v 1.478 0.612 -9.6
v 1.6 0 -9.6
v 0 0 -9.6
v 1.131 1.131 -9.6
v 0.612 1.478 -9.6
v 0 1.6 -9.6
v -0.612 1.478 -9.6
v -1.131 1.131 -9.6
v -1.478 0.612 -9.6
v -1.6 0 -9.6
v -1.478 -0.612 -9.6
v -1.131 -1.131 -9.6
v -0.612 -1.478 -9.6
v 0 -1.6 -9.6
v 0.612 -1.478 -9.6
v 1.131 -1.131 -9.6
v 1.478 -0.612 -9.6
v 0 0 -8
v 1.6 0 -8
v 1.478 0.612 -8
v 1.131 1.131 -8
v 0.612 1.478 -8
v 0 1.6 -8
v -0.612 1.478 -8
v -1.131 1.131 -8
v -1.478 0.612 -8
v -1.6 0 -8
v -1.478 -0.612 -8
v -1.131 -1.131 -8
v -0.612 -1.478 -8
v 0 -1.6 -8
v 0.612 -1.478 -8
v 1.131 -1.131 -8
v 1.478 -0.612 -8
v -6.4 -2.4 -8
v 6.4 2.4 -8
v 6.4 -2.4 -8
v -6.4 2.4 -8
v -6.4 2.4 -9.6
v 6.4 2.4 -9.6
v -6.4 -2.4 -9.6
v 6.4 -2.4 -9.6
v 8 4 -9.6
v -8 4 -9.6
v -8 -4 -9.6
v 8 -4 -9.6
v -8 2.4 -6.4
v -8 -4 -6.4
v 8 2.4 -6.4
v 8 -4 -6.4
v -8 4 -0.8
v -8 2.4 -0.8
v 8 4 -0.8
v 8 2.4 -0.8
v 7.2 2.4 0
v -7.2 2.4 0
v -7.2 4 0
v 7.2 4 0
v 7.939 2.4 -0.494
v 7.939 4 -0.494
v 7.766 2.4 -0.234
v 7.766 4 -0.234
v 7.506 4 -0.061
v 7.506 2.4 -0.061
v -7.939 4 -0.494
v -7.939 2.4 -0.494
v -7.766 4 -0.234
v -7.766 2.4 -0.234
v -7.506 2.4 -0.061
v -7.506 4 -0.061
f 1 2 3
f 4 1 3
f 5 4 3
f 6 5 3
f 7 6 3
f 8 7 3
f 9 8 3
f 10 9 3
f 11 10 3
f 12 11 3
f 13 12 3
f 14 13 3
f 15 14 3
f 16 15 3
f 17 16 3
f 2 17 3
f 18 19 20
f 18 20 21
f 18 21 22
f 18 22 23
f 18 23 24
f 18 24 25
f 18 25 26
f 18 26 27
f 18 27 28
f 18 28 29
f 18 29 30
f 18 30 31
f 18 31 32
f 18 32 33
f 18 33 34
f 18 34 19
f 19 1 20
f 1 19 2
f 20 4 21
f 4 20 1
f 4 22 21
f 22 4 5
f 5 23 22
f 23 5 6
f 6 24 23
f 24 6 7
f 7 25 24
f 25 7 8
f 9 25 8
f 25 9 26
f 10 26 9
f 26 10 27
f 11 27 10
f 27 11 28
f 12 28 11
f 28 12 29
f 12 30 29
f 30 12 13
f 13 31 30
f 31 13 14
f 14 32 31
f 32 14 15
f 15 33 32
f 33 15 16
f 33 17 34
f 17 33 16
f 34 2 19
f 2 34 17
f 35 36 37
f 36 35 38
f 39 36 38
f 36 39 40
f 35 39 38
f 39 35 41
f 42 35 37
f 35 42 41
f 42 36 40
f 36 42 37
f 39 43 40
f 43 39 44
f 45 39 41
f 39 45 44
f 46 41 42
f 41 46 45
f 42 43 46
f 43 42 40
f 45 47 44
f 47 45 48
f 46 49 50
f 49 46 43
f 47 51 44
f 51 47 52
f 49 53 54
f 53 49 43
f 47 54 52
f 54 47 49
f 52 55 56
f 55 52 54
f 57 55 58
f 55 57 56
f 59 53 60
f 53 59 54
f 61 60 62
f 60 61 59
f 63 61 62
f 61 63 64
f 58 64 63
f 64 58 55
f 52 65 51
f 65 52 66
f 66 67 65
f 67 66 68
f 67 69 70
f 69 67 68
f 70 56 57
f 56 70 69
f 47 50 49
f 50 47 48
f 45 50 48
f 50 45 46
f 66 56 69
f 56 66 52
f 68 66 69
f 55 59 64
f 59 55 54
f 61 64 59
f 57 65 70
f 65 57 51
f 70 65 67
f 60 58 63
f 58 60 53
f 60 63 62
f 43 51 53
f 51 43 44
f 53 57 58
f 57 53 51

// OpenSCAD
// file: ../p/4-4edge.scad
use <../lib.scad>
function ldraw_lib__4_4edge() = [
// 0 Circle 1.0
// 0 Name: 4-4edge.dat
// 0 Author: James Jessiman
// 0 !LDRAW_ORG Primitive UPDATE 2017-01
// 0 !LICENSE Licensed under CC BY 2.0 and CC BY 4.0 : see CAreadme.txt
// 
// 0 BFC CERTIFY CCW
  [0,"BFC","CERTIFY"],
  [0,"BFC","CCW"],
// 
// 0 !HISTORY 1998-12-15 [PTadmin] Official Update 1998-10
// 0 !HISTORY 2005-12-28 [PTadmin] Official Update 2005-01
// 0 !HISTORY 2007-06-24 [PTadmin] Header formatted for Contributor Agreement
// 0 !HISTORY 2008-07-01 [PTadmin] Official Update 2008-01
// 0 !HISTORY 2017-01-15 [Steffen] BFCed
// 0 !HISTORY 2017-12-30 [PTadmin] Official Update 2017-01
// 
// 
// 2 24 1 0 0 0.9239 0 0.3827
  [2,24,1,0,0,0.9239,0,0.3827],
// 2 24 0.9239 0 0.3827 0.7071 0 0.7071
  [2,24,0.9239,0,0.3827,0.7071,0,0.7071],
// 2 24 0.7071 0 0.7071 0.3827 0 0.9239
  [2,24,0.7071,0,0.7071,0.3827,0,0.9239],
// 2 24 0.3827 0 0.9239 0 0 1
  [2,24,0.3827,0,0.9239,0,0,1],
// 2 24 0 0 1 -0.3827 0 0.9239
  [2,24,0,0,1,-0.3827,0,0.9239],
// 2 24 -0.3827 0 0.9239 -0.7071 0 0.7071
  [2,24,-0.3827,0,0.9239,-0.7071,0,0.7071],
// 2 24 -0.7071 0 0.7071 -0.9239 0 0.3827
  [2,24,-0.7071,0,0.7071,-0.9239,0,0.3827],
// 2 24 -0.9239 0 0.3827 -1 0 -0
  [2,24,-0.9239,0,0.3827,-1,0,-0],
// 2 24 -1 0 -0 -0.9239 0 -0.3827
  [2,24,-1,0,-0,-0.9239,0,-0.3827],
// 2 24 -0.9239 0 -0.3827 -0.7071 0 -0.7071
  [2,24,-0.9239,0,-0.3827,-0.7071,0,-0.7071],
// 2 24 -0.7071 0 -0.7071 -0.3827 0 -0.9239
  [2,24,-0.7071,0,-0.7071,-0.3827,0,-0.9239],
// 2 24 -0.3827 0 -0.9239 0 0 -1
  [2,24,-0.3827,0,-0.9239,0,0,-1],
// 2 24 0 0 -1 0.3827 0 -0.9239
  [2,24,0,0,-1,0.3827,0,-0.9239],
// 2 24 0.3827 0 -0.9239 0.7071 0 -0.7071
  [2,24,0.3827,0,-0.9239,0.7071,0,-0.7071],
// 2 24 0.7071 0 -0.7071 0.9239 0 -0.3827
  [2,24,0.7071,0,-0.7071,0.9239,0,-0.3827],
// 2 24 0.9239 0 -0.3827 1 0 0
  [2,24,0.9239,0,-0.3827,1,0,0],
];
module ldraw_lib__4_4edge(step=0, col=false, unit=2/5, alt=false, line=0.2, solid=!$preview)
    makepoly(ldraw_lib__4_4edge(), step=step, col=col, unit=unit, alt=alt, line=line, solid=solid);
ldraw_lib__4_4edge(line=0.2);
// file: ../p/4-4disc.scad
use <../lib.scad>
function ldraw_lib__4_4disc() = [
// 0 Disc 1.0
// 0 Name: 4-4disc.dat
// 0 Author: James Jessiman
// 0 !LDRAW_ORG Primitive UPDATE 2002-02
// 0 !LICENSE Licensed under CC BY 2.0 and CC BY 4.0 : see CAreadme.txt
// 
// 0 BFC CERTIFY CCW
  [0,"BFC","CERTIFY"],
  [0,"BFC","CCW"],
// 
// 0 !HISTORY 1998-12-15 [PTadmin] Official Update 1998-10
// 0 !HISTORY 2002-03-23 [sbliss] Added BFC statement
// 0 !HISTORY 2002-04-25 [PTadmin] Official Update 2002-02
// 0 !HISTORY 2007-06-24 [PTadmin] Header formatted for Contributor Agreement
// 0 !HISTORY 2008-07-01 [PTadmin] Official Update 2008-01
// 
// 
// 3 16 0 0 0 1 0 0 0.9239 0 0.3827
  [3,16,0,0,0,1,0,0,0.9239,0,0.3827],
// 3 16 0 0 0 0.9239 0 0.3827 0.7071 0 0.7071
  [3,16,0,0,0,0.9239,0,0.3827,0.7071,0,0.7071],
// 3 16 0 0 0 0.7071 0 0.7071 0.3827 0 0.9239
  [3,16,0,0,0,0.7071,0,0.7071,0.3827,0,0.9239],
// 3 16 0 0 0 0.3827 0 0.9239 0 0 1
  [3,16,0,0,0,0.3827,0,0.9239,0,0,1],
// 3 16 0 0 0 0 0 1 -0.3827 0 0.9239
  [3,16,0,0,0,0,0,1,-0.3827,0,0.9239],
// 3 16 0 0 0 -0.3827 0 0.9239 -0.7071 0 0.7071
  [3,16,0,0,0,-0.3827,0,0.9239,-0.7071,0,0.7071],
// 3 16 0 0 0 -0.7071 0 0.7071 -0.9239 0 0.3827
  [3,16,0,0,0,-0.7071,0,0.7071,-0.9239,0,0.3827],
// 3 16 0 0 0 -0.9239 0 0.3827 -1 0 -0
  [3,16,0,0,0,-0.9239,0,0.3827,-1,0,-0],
// 3 16 0 0 0 -1 0 -0 -0.9239 0 -0.3827
  [3,16,0,0,0,-1,0,-0,-0.9239,0,-0.3827],
// 3 16 0 0 0 -0.9239 0 -0.3827 -0.7071 0 -0.7071
  [3,16,0,0,0,-0.9239,0,-0.3827,-0.7071,0,-0.7071],
// 3 16 0 0 0 -0.7071 0 -0.7071 -0.3827 0 -0.9239
  [3,16,0,0,0,-0.7071,0,-0.7071,-0.3827,0,-0.9239],
// 3 16 0 0 0 -0.3827 0 -0.9239 0 0 -1
  [3,16,0,0,0,-0.3827,0,-0.9239,0,0,-1],
// 3 16 0 0 0 0 0 -1 0.3827 0 -0.9239
  [3,16,0,0,0,0,0,-1,0.3827,0,-0.9239],
// 3 16 0 0 0 0.3827 0 -0.9239 0.7071 0 -0.7071
  [3,16,0,0,0,0.3827,0,-0.9239,0.7071,0,-0.7071],
// 3 16 0 0 0 0.7071 0 -0.7071 0.9239 0 -0.3827
  [3,16,0,0,0,0.7071,0,-0.7071,0.9239,0,-0.3827],
// 3 16 0 0 0 0.9239 0 -0.3827 1 0 0
  [3,16,0,0,0,0.9239,0,-0.3827,1,0,0],
// 0
];
module ldraw_lib__4_4disc(step=0, col=false, unit=2/5, alt=false, line=0.2, solid=!$preview)
    makepoly(ldraw_lib__4_4disc(), step=step, col=col, unit=unit, alt=alt, line=line, solid=solid);
ldraw_lib__4_4disc(line=0.2);
// file: ../p/4-4cyli.scad
use <../lib.scad>
$fa=1; $fs=0.2;
function ldraw_lib__4_4cyli(realsolid=false) = [
// 0 Cylinder 1.0
// 0 Name: 4-4cyli.dat
// 0 Author: James Jessiman
// 0 !LDRAW_ORG Primitive UPDATE 2005-01
// 0 !LICENSE Licensed under CC BY 2.0 and CC BY 4.0 : see CAreadme.txt
// 
// 0 BFC CERTIFY CCW
  [0,"BFC","CERTIFY"],
  [0,"BFC","CCW"],
// 
// 0 !HISTORY 1998-12-15 [PTadmin] Official Update 1998-10
// 0 !HISTORY 2002-03-23 [sbliss] Added BFC statement; merged headers from files in distributions LDraw 0.27 and Complete.
// 0 !HISTORY 2002-04-25 [PTadmin] Official Update 2002-02
// 0 !HISTORY 2004-12-14 [guyvivan] BFC CCW
// 0 !HISTORY 2005-12-28 [PTadmin] Official Update 2005-01
// 0 !HISTORY 2007-06-24 [PTadmin] Header formatted for Contributor Agreement
// 0 !HISTORY 2008-07-01 [PTadmin] Official Update 2008-01
// 
// 
// 4 16 1 1 0 0.9239 1 0.3827 0.9239 0 0.3827 1 0 0
  [4,16,1,1,0,0.9239,1,0.3827,0.9239,0,0.3827,1,0,0],
// 5 24 1 0 0 1 1 0 0.9239 0 0.3827 0.9239 0 -0.3827
  [5,24,1,0,0,1,1,0,0.9239,0,0.3827,0.9239,0,-0.3827],
// 4 16 0.9239 1 0.3827 0.7071 1 0.7071 0.7071 0 0.7071 0.9239 0 0.3827
  [4,16,0.9239,1,0.3827,0.7071,1,0.7071,0.7071,0,0.7071,0.9239,0,0.3827],
// 5 24 0.9239 0 0.3827 0.9239 1 0.3827 0.7071 0 0.7071 1 0 0
  [5,24,0.9239,0,0.3827,0.9239,1,0.3827,0.7071,0,0.7071,1,0,0],
// 4 16 0.7071 1 0.7071 0.3827 1 0.9239 0.3827 0 0.9239 0.7071 0 0.7071
  [4,16,0.7071,1,0.7071,0.3827,1,0.9239,0.3827,0,0.9239,0.7071,0,0.7071],
// 5 24 0.7071 0 0.7071 0.7071 1 0.7071 0.3827 0 0.9239 0.9239 0 0.3827
  [5,24,0.7071,0,0.7071,0.7071,1,0.7071,0.3827,0,0.9239,0.9239,0,0.3827],
// 4 16 0.3827 1 0.9239 0 1 1 0 0 1 0.3827 0 0.9239
  [4,16,0.3827,1,0.9239,0,1,1,0,0,1,0.3827,0,0.9239],
// 5 24 0.3827 0 0.9239 0.3827 1 0.9239 0 0 1 0.7071 0 0.7071
  [5,24,0.3827,0,0.9239,0.3827,1,0.9239,0,0,1,0.7071,0,0.7071],
// 4 16 0 1 1 -0.3827 1 0.9239 -0.3827 0 0.9239 0 0 1
  [4,16,0,1,1,-0.3827,1,0.9239,-0.3827,0,0.9239,0,0,1],
// 5 24 0 0 1 0 1 1 -0.3827 0 0.9239 0.3827 0 0.9239
  [5,24,0,0,1,0,1,1,-0.3827,0,0.9239,0.3827,0,0.9239],
// 4 16 -0.3827 1 0.9239 -0.7071 1 0.7071 -0.7071 0 0.7071 -0.3827 0 0.9239
  [4,16,-0.3827,1,0.9239,-0.7071,1,0.7071,-0.7071,0,0.7071,-0.3827,0,0.9239],
// 5 24 -0.3827 0 0.9239 -0.3827 1 0.9239 -0.7071 0 0.7071 0 0 1
  [5,24,-0.3827,0,0.9239,-0.3827,1,0.9239,-0.7071,0,0.7071,0,0,1],
// 4 16 -0.7071 1 0.7071 -0.9239 1 0.3827 -0.9239 0 0.3827 -0.7071 0 0.7071
  [4,16,-0.7071,1,0.7071,-0.9239,1,0.3827,-0.9239,0,0.3827,-0.7071,0,0.7071],
// 5 24 -0.7071 0 0.7071 -0.7071 1 0.7071 -0.9239 0 0.3827 -0.3827 0 0.9239
  [5,24,-0.7071,0,0.7071,-0.7071,1,0.7071,-0.9239,0,0.3827,-0.3827,0,0.9239],
// 4 16 -0.9239 1 0.3827 -1 1 0 -1 0 0 -0.9239 0 0.3827
  [4,16,-0.9239,1,0.3827,-1,1,0,-1,0,0,-0.9239,0,0.3827],
// 5 24 -0.9239 0 0.3827 -0.9239 1 0.3827 -1 0 0 -0.7071 0 0.7071
  [5,24,-0.9239,0,0.3827,-0.9239,1,0.3827,-1,0,0,-0.7071,0,0.7071],
// 4 16 -1 1 0 -0.9239 1 -0.3827 -0.9239 0 -0.3827 -1 0 0
  [4,16,-1,1,0,-0.9239,1,-0.3827,-0.9239,0,-0.3827,-1,0,0],
// 5 24 -1 0 0 -1 1 0 -0.9239 0 -0.3827 -0.9239 0 0.3827
  [5,24,-1,0,0,-1,1,0,-0.9239,0,-0.3827,-0.9239,0,0.3827],
// 4 16 -0.9239 1 -0.3827 -0.7071 1 -0.7071 -0.7071 0 -0.7071 -0.9239 0 -0.3827
  [4,16,-0.9239,1,-0.3827,-0.7071,1,-0.7071,-0.7071,0,-0.7071,-0.9239,0,-0.3827],
// 5 24 -0.9239 0 -0.3827 -0.9239 1 -0.3827 -0.7071 0 -0.7071 -1 0 0
  [5,24,-0.9239,0,-0.3827,-0.9239,1,-0.3827,-0.7071,0,-0.7071,-1,0,0],
// 4 16 -0.7071 1 -0.7071 -0.3827 1 -0.9239 -0.3827 0 -0.9239 -0.7071 0 -0.7071
  [4,16,-0.7071,1,-0.7071,-0.3827,1,-0.9239,-0.3827,0,-0.9239,-0.7071,0,-0.7071],
// 5 24 -0.7071 0 -0.7071 -0.7071 1 -0.7071 -0.3827 0 -0.9239 -0.9239 0 -0.3827
  [5,24,-0.7071,0,-0.7071,-0.7071,1,-0.7071,-0.3827,0,-0.9239,-0.9239,0,-0.3827],
// 4 16 -0.3827 1 -0.9239 0 1 -1 0 0 -1 -0.3827 0 -0.9239
  [4,16,-0.3827,1,-0.9239,0,1,-1,0,0,-1,-0.3827,0,-0.9239],
// 5 24 -0.3827 0 -0.9239 -0.3827 1 -0.9239 0 0 -1 -0.7071 0 -0.7071
  [5,24,-0.3827,0,-0.9239,-0.3827,1,-0.9239,0,0,-1,-0.7071,0,-0.7071],
// 4 16 0 1 -1 0.3827 1 -0.9239 0.3827 0 -0.9239 0 0 -1
  [4,16,0,1,-1,0.3827,1,-0.9239,0.3827,0,-0.9239,0,0,-1],
// 5 24 0 0 -1 0 1 -1 0.3827 0 -0.9239 -0.3827 0 -0.9239
  [5,24,0,0,-1,0,1,-1,0.3827,0,-0.9239,-0.3827,0,-0.9239],
// 4 16 0.3827 1 -0.9239 0.7071 1 -0.7071 0.7071 0 -0.7071 0.3827 0 -0.9239
  [4,16,0.3827,1,-0.9239,0.7071,1,-0.7071,0.7071,0,-0.7071,0.3827,0,-0.9239],
// 5 24 0.3827 0 -0.9239 0.3827 1 -0.9239 0.7071 0 -0.7071 0 0 -1
  [5,24,0.3827,0,-0.9239,0.3827,1,-0.9239,0.7071,0,-0.7071,0,0,-1],
// 4 16 0.7071 1 -0.7071 0.9239 1 -0.3827 0.9239 0 -0.3827 0.7071 0 -0.7071
  [4,16,0.7071,1,-0.7071,0.9239,1,-0.3827,0.9239,0,-0.3827,0.7071,0,-0.7071],
// 5 24 0.7071 0 -0.7071 0.7071 1 -0.7071 0.9239 0 -0.3827 0.3827 0 -0.9239
  [5,24,0.7071,0,-0.7071,0.7071,1,-0.7071,0.9239,0,-0.3827,0.3827,0,-0.9239],
// 4 16 0.9239 1 -0.3827 1 1 0 1 0 0 0.9239 0 -0.3827
  [4,16,0.9239,1,-0.3827,1,1,0,1,0,0,0.9239,0,-0.3827],
// 5 24 0.9239 0 -0.3827 0.9239 1 -0.3827 1 0 0 0.7071 0 -0.7071
  [5,24,0.9239,0,-0.3827,0.9239,1,-0.3827,1,0,0,0.7071,0,-0.7071],
// 0
];
module ldraw_lib__4_4cyli(step=0, col=false, unit=2/5, alt=false, line=0.2, solid=!$preview)
    makepoly(ldraw_lib__4_4cyli(solid), step=step, col=col, unit=unit, alt=alt, line=line, solid=solid);
ldraw_lib__4_4cyli(line=0.2);
// file: ../p/1-4edge.scad
use <../lib.scad>
$fa=1; $fs=0.2;
function ldraw_lib__1_4edge(realsolid=false) = [
// 0 Circle 0.25
// 0 Name: 1-4edge.dat
// 0 Author: James Jessiman
// 0 !LDRAW_ORG Primitive UPDATE 2017-01
// 0 !LICENSE Licensed under CC BY 2.0 and CC BY 4.0 : see CAreadme.txt
// 
// 0 BFC CERTIFY CCW
  [0,"BFC","CERTIFY"],
  [0,"BFC","CCW"],
// 
// 0 !HISTORY 2007-06-22 [PTadmin] Header formatted for Contributor Agreement
// 0 !HISTORY 2008-07-01 [PTadmin] Official Update 2008-01
// 0 !HISTORY 2017-01-15 [Steffen] BFCed
// 0 !HISTORY 2017-12-30 [PTadmin] Official Update 2017-01
// 
// 
// 2 24 1 0 0 0.9239 0 0.3827
  [2,24,1,0,0,0.9239,0,0.3827],
// 2 24 0.9239 0 0.3827 0.7071 0 0.7071
  [2,24,0.9239,0,0.3827,0.7071,0,0.7071],
// 2 24 0.7071 0 0.7071 0.3827 0 0.9239
  [2,24,0.7071,0,0.7071,0.3827,0,0.9239],
// 2 24 0.3827 0 0.9239 0 0 1
  [2,24,0.3827,0,0.9239,0,0,1],
];
module ldraw_lib__1_4edge(step=0, col=false, unit=2/5, alt=false, line=0.2, solid=!$preview)
    makepoly(ldraw_lib__1_4edge(solid), step=step, col=col, unit=unit, alt=alt, line=line, solid=solid);
ldraw_lib__1_4edge(line=0.2);
// file: ../p/1-4cyli.scad
use <../lib.scad>
function ldraw_lib__1_4cyli() = [
// 0 Cylinder 0.25
// 0 Name: 1-4cyli.dat
// 0 Author: James Jessiman
// 0 !LDRAW_ORG Primitive UPDATE 2012-01
// 0 !LICENSE Licensed under CC BY 2.0 and CC BY 4.0 : see CAreadme.txt
// 
// 0 BFC CERTIFY CCW
  [0,"BFC","CERTIFY"],
  [0,"BFC","CCW"],
// 
// 0 !HISTORY 2002-03-23 [sbliss] Added BFC statement.
// 0 !HISTORY 2002-04-25 [PTadmin] Official Update 2002-02
// 0 !HISTORY 2007-06-22 [PTadmin] Header formatted for Contributor Agreement
// 0 !HISTORY 2008-07-01 [PTadmin] Official Update 2008-01
// 0 !HISTORY 2012-02-16 [Philo] Changed to CCW
// 0 !HISTORY 2012-03-30 [PTadmin] Official Update 2012-01
// 
// 
// 4 16 1 1 0 0.9239 1 0.3827 0.9239 0 0.3827 1 0 0
  [4,16,1,1,0,0.9239,1,0.3827,0.9239,0,0.3827,1,0,0],
// 5 24 1 0 0 1 1 0 0.9239 0 0.3827 1 0 -1
  [5,24,1,0,0,1,1,0,0.9239,0,0.3827,1,0,-1],
// 4 16 0.9239 1 0.3827 0.7071 1 0.7071 0.7071 0 0.7071 0.9239 0 0.3827
  [4,16,0.9239,1,0.3827,0.7071,1,0.7071,0.7071,0,0.7071,0.9239,0,0.3827],
// 5 24 0.9239 0 0.3827 0.9239 1 0.3827 0.7071 0 0.7071 1 0 0
  [5,24,0.9239,0,0.3827,0.9239,1,0.3827,0.7071,0,0.7071,1,0,0],
// 4 16 0.7071 1 0.7071 0.3827 1 0.9239 0.3827 0 0.9239 0.7071 0 0.7071
  [4,16,0.7071,1,0.7071,0.3827,1,0.9239,0.3827,0,0.9239,0.7071,0,0.7071],
// 5 24 0.7071 0 0.7071 0.7071 1 0.7071 0.3827 0 0.9239 0.9239 0 0.3827
  [5,24,0.7071,0,0.7071,0.7071,1,0.7071,0.3827,0,0.9239,0.9239,0,0.3827],
// 4 16 0.3827 1 0.9239 0 1 1 0 0 1 0.3827 0 0.9239
  [4,16,0.3827,1,0.9239,0,1,1,0,0,1,0.3827,0,0.9239],
// 5 24 0.3827 0 0.9239 0.3827 1 0.9239 0 0 1 0.7071 0 0.7071
  [5,24,0.3827,0,0.9239,0.3827,1,0.9239,0,0,1,0.7071,0,0.7071],
// 5 24 0 0 1 0 1 1 0.3827 0 0.9239 -1 0 1
  [5,24,0,0,1,0,1,1,0.3827,0,0.9239,-1,0,1],
];
module ldraw_lib__1_4cyli(step=0, col=false, unit=2/5, alt=false, line=0.2, solid=!$preview)
    makepoly(ldraw_lib__1_4cyli(), step=step, col=col, unit=unit, alt=alt, line=line, solid=solid);
ldraw_lib__1_4cyli(line=0.2);
// file: ../p/stud3.scad
use <../lib.scad>
use <4-4cyli.scad>
use <4-4disc.scad>
use <4-4edge.scad>
function ldraw_lib__stud3() = [
// 0 Stud Tube Solid
// 0 Name: stud3.dat
// 0 Author: James Jessiman
// 0 !LDRAW_ORG Primitive UPDATE 2012-01
// 0 !LICENSE Licensed under CC BY 4.0 : see CAreadme.txt
// 
// 0 BFC CERTIFY CCW
  [0,"BFC","CERTIFY"],
  [0,"BFC","CCW"],
// 
// 0 !HISTORY 2002-04-04 [sbliss] Modified for BFC compliance
// 0 !HISTORY 2002-04-25 [PTadmin] Official Update 2002-02
// 0 !HISTORY 2007-06-24 [PTadmin] Header formatted for Contributor Agreement
// 0 !HISTORY 2008-07-01 [PTadmin] Official Update 2008-01
// 0 !HISTORY 2012-02-16 [Philo] Changed to CCW
// 0 !HISTORY 2012-03-30 [PTadmin] Official Update 2012-01
// 
// 
// 1 16 0 -4 0 4 0 0 0 1 0 0 0 4 4-4edge.dat
  [1,16,0,-4,0,4,0,0,0,1,0,0,0,4, ldraw_lib__4_4edge()],
// 1 16 0 0 0 4 0 0 0 1 0 0 0 4 4-4edge.dat
  [1,16,0,0,0,4,0,0,0,1,0,0,0,4, ldraw_lib__4_4edge()],
// 1 16 0 -4 0 4 0 0 0 1 0 0 0 4 4-4disc.dat
  [1,16,0,-4,0,4,0,0,0,1,0,0,0,4, ldraw_lib__4_4disc()],
  [-1,16,0,0,0,4,0,0,0,-1,0,0,0,4, ldraw_lib__4_4disc()],
// 1 16 0 -4 0 4 0 0 0 4 0 0 0 4 4-4cyli.dat
  [1,16,0,-4,0,4,0,0,0,4,0,0,0,4, ldraw_lib__4_4cyli()],
];
module ldraw_lib__stud3(step=0, col=false, unit=2/5, alt=false, line=0.2, solid=!$preview)
    makepoly(ldraw_lib__stud3(), step=step, col=col, unit=unit, alt=alt, line=line, solid=solid);
ldraw_lib__stud3(line=0.2);
// file: ../p/box5.scad
use <../lib.scad>
function ldraw_lib__box5() = [
// 0 Box with 5 Faces and All Edges
// 0 Name: box5.dat
// 0 Author: James Jessiman
// 0 !LDRAW_ORG Primitive UPDATE 2012-01
// 0 !LICENSE Licensed under CC BY 2.0 and CC BY 4.0 : see CAreadme.txt
// 
// 0 BFC CERTIFY CCW
  [0,"BFC","CERTIFY"],
  [0,"BFC","CCW"],
// 
// 0 !HISTORY 2002-04-03 [sbliss] Modified for BFC compliance
// 0 !HISTORY 2002-04-25 [PTadmin] Official Update 2002-02
// 0 !HISTORY 2007-06-24 [PTadmin] Header formatted for Contributor Agreement
// 0 !HISTORY 2008-07-01 [PTadmin] Official Update 2008-01
// 0 !HISTORY 2012-02-16 [Philo] Changed to CCW
// 0 !HISTORY 2012-03-30 [PTadmin] Official Update 2012-01
// 
// 
// 2 24 1 1 1 -1 1 1
  [2,24,1,1,1,-1,1,1],
// 2 24 -1 1 1 -1 1 -1
  [2,24,-1,1,1,-1,1,-1],
// 2 24 -1 1 -1 1 1 -1
  [2,24,-1,1,-1,1,1,-1],
// 2 24 1 1 -1 1 1 1
  [2,24,1,1,-1,1,1,1],
// 2 24 1 0 1 -1 0 1
  [2,24,1,0,1,-1,0,1],
// 2 24 -1 0 1 -1 0 -1
  [2,24,-1,0,1,-1,0,-1],
// 2 24 -1 0 -1 1 0 -1
  [2,24,-1,0,-1,1,0,-1],
// 2 24 1 0 -1 1 0 1
  [2,24,1,0,-1,1,0,1],
// 2 24 1 0 1 1 1 1
  [2,24,1,0,1,1,1,1],
// 2 24 -1 0 1 -1 1 1
  [2,24,-1,0,1,-1,1,1],
// 2 24 1 0 -1 1 1 -1
  [2,24,1,0,-1,1,1,-1],
// 2 24 -1 0 -1 -1 1 -1
  [2,24,-1,0,-1,-1,1,-1],
// 4 16 -1 1 1 1 1 1 1 1 -1 -1 1 -1
  [4,16,-1,1,1,1,1,1,1,1,-1,-1,1,-1],
// 4 16 -1 1 1 -1 0 1 1 0 1 1 1 1
  [4,16,-1,1,1,-1,0,1,1,0,1,1,1,1],
// 4 16 -1 1 -1 -1 0 -1 -1 0 1 -1 1 1
  [4,16,-1,1,-1,-1,0,-1,-1,0,1,-1,1,1],
// 4 16 1 1 -1 1 0 -1 -1 0 -1 -1 1 -1
  [4,16,1,1,-1,1,0,-1,-1,0,-1,-1,1,-1],
// 4 16 1 1 1 1 0 1 1 0 -1 1 1 -1
  [4,16,1,1,1,1,0,1,1,0,-1,1,1,-1],
];
makepoly(ldraw_lib__box5(), line=0.2);
// file: ../p/box2-5.scad
use <../lib.scad>
$fa=1; $fs=0.2;
function ldraw_lib__box2_5(realsolid=false) = [
// 0 Box with 2 Faces without 5 Edges
// 0 Name: box2-5.dat
// 0 Author: Steffen [Steffen]
// 0 !LDRAW_ORG Primitive UPDATE 2003-03
// 0 !LICENSE Licensed under CC BY 2.0 and CC BY 4.0 : see CAreadme.txt
// 
// 0 BFC CERTIFY CCW
  [0,"BFC","CERTIFY"],
  [0,"BFC","CCW"],
// 
// 0 !HISTORY 2003-12-19 [PTadmin] Official Update 2003-03
// 0 !HISTORY 2007-06-24 [PTadmin] Header formatted for Contributor Agreement
// 0 !HISTORY 2008-07-01 [PTadmin] Official Update 2008-01
// 
// 
// 2 24 1 1 1 -1 1 1
  [2,24,1,1,1,-1,1,1],
// 2 24 1 1 -1 -1 1 -1
  [2,24,1,1,-1,-1,1,-1],
// 2 24 1 -1 1 -1 -1 1
  [2,24,1,-1,1,-1,-1,1],
// 2 24 -1 -1 1 -1 1 1
  [2,24,-1,-1,1,-1,1,1],
// 2 24 1 -1 1 1 1 1
  [2,24,1,-1,1,1,1,1],
// 2 24 -1 1 -1 -1 1 1
  [2,24,-1,1,-1,-1,1,1],
// 2 24 1 1 -1 1 1 1
  [2,24,1,1,-1,1,1,1],
// 4 16 1 1 1 1 1 -1 -1 1 -1 -1 1 1
  [4,16,1,1,1,1,1,-1,-1,1,-1,-1,1,1],
// 4 16 1 1 1 -1 1 1 -1 -1 1 1 -1 1
  [4,16,1,1,1,-1,1,1,-1,-1,1,1,-1,1],
// 0
];
module ldraw_lib__box2_5(step=0, col=false, unit=2/5, alt=false, line=0.2, solid=!$preview)
    makepoly(ldraw_lib__box2_5(solid), step=step, col=col, unit=unit, alt=alt, line=line, solid=solid);
ldraw_lib__box2_5(line=0.2);
// file: ../p/1-4cylo.scad
use <../lib.scad>
use <1-4cyli.scad>
use <1-4edge.scad>
$fa=1; $fs=0.2;
function ldraw_lib__1_4cylo(realsolid=false) = [
// 0 Cylinder Open 0.25
// 0 Name: 1-4cylo.dat
// 0 Author: Max Martin Richter [MMR1988]
// 0 !LDRAW_ORG Primitive UPDATE 2010-03
// 0 !LICENSE Licensed under CC BY 2.0 and CC BY 4.0 : see CAreadme.txt
// 
// 0 BFC CERTIFY CCW
  [0,"BFC","CERTIFY"],
  [0,"BFC","CCW"],
// 
// 0 !HISTORY 2010-12-31 [PTadmin] Official Update 2010-03
// 
// 
// 1 16 0 0 0 1 0 0 0 1 0 0 0 1 1-4edge.dat
  [1,16,0,0,0,1,0,0,0,1,0,0,0,1, ldraw_lib__1_4edge(realsolid)],
// 1 16 0 1 0 1 0 0 0 1 0 0 0 1 1-4edge.dat
  [1,16,0,1,0,1,0,0,0,1,0,0,0,1, ldraw_lib__1_4edge(realsolid)],
// 1 16 0 0 0 1 0 0 0 1 0 0 0 1 1-4cyli.dat
  [1,16,0,0,0,1,0,0,0,1,0,0,0,1, ldraw_lib__1_4cyli(realsolid)],
];
module ldraw_lib__1_4cylo(step=0, col=false, unit=2/5, alt=false, line=0.2, solid=!$preview)
    makepoly(ldraw_lib__1_4cylo(solid), step=step, col=col, unit=unit, alt=alt, line=line, solid=solid);
ldraw_lib__1_4cylo(line=0.2);
// file: s/4865bs01.scad
use <../../lib.scad>
use <../../p/1-4chrd.scad>
use <../../p/1-4cylo.scad>
use <../../p/box2-5.scad>
use <../../p/box5.scad>
use <../../p/stud3.scad>
function ldraw_lib__s__4865bs01() = [
// 0 ~Panel  1 x  2 x  1 with Rounded Corners without Front Face
// 0 Name: s\4865bs01.dat
// 0 Author: Damien Roux [Darats]
// 0 !LDRAW_ORG Subpart UPDATE 2016-01
// 0 !LICENSE Licensed under CC BY 2.0 and CC BY 4.0 : see CAreadme.txt
// 
// 0 BFC CERTIFY CCW
  [0,"BFC","CERTIFY"],
  [0,"BFC","CCW"],
// 
// 0 !HISTORY 2016-12-31 [PTadmin] Official Update 2016-01
// 
// 
// 1 16 0 20 0 1 0 0 0 -1 0 0 0 1 stud3.dat
  [1,16,0,20,0,1,0,0,0,-1,0,0,0,1, ldraw_lib__stud3()],
// 0 BFC INVERTNEXT
  [0,"BFC","INVERTNEXT"],
// 1 16 0 24 0 16 0 0 0 -4 0 0 0 6 box5.dat
  [1,16,0,24,0,16,0,0,0,-4,0,0,0,6, ldraw_lib__box5()],
// 4 16 20 24 10 16 24 6 -16 24 6 -20 24 10
  [4,16,20,24,10,16,24,6,-16,24,6,-20,24,10],
// 4 16 -20 24 10 -16 24 6 -16 24 -6 -20 24 -10
  [4,16,-20,24,10,-16,24,6,-16,24,-6,-20,24,-10],
// 4 16 -20 24 -10 -16 24 -6 16 24 -6 20 24 -10
  [4,16,-20,24,-10,-16,24,-6,16,24,-6,20,24,-10],
// 4 16 20 24 -10 16 24 -6 16 24 6 20 24 10
  [4,16,20,24,-10,16,24,-6,16,24,6,20,24,10],
// 2 24 20 24 10 -20 24 10
  [2,24,20,24,10,-20,24,10],
// 2 24 -20 24 10 -20 24 -10
  [2,24,-20,24,10,-20,24,-10],
// 2 24 20 24 -10 20 24 10
  [2,24,20,24,-10,20,24,10],
// 2 24 20 2 6 20 16 6
  [2,24,20,2,6,20,16,6],
// 2 24 -20 2 6 -20 16 6
  [2,24,-20,2,6,-20,16,6],
// 2 24 20 2 10 20 24 10
  [2,24,20,2,10,20,24,10],
// 2 24 -20 2 10 -20 24 10
  [2,24,-20,2,10,-20,24,10],
// 2 24 18 0 10 -18 0 10
  [2,24,18,0,10,-18,0,10],
// 2 24 -18 0 6 18 0 6
  [2,24,-18,0,6,18,0,6],
// 4 16 -20 24 10 -20 24 -10 -20 16 -10 -20 16 6
  [4,16,-20,24,10,-20,24,-10,-20,16,-10,-20,16,6],
// 4 16 20 24 -10 20 24 10 20 16 6 20 16 -10
  [4,16,20,24,-10,20,24,10,20,16,6,20,16,-10],
// 4 16 -20 24 10 -20 16 6 -20 2 6 -20 2 10
  [4,16,-20,24,10,-20,16,6,-20,2,6,-20,2,10],
// 4 16 20 16 6 20 24 10 20 2 10 20 2 6
  [4,16,20,16,6,20,24,10,20,2,10,20,2,6],
// 4 16 -20 16 6 20 16 6 20 2 6 -20 2 6
  [4,16,-20,16,6,20,16,6,20,2,6,-20,2,6],
// 4 16 -20 2 6 20 2 6 18 0 6 -18 0 6
  [4,16,-20,2,6,20,2,6,18,0,6,-18,0,6],
// 4 16 18 0 6 18 0 10 -18 0 10 -18 0 6
  [4,16,18,0,6,18,0,10,-18,0,10,-18,0,6],
// 1 16 18 2 6 2 0 0 0 0 -2 0 4 0 1-4cylo.dat
  [1,16,18,2,6,2,0,0,0,0,-2,0,4,0, ldraw_lib__1_4cylo()],
// 1 16 -18 2 10 -2 0 0 0 0 -2 0 -4 0 1-4cylo.dat
  [1,16,-18,2,10,-2,0,0,0,0,-2,0,-4,0, ldraw_lib__1_4cylo()],
// 1 16 0 20 -2 -20 0 0 0 -4 0 0 0 -8 box2-5.dat
  [1,16,0,20,-2,-20,0,0,0,-4,0,0,0,-8, ldraw_lib__box2_5()],
// 1 16 -18 2 6 0 0 -2 -2 0 0 0 1 0 1-4chrd.dat
  [1,16,-18,2,6,0,0,-2,-2,0,0,0,1,0, ldraw_lib__1_4chrd()],
// 1 16 18 2 6 2 0 0 0 0 -2 0 1 0 1-4chrd.dat
  [1,16,18,2,6,2,0,0,0,0,-2,0,1,0, ldraw_lib__1_4chrd()],
];
makepoly(ldraw_lib__s__4865bs01(), line=0.2);
// file: ../p/1-4chrd.scad
use <../lib.scad>
$fa=1; $fs=0.2;
function ldraw_lib__1_4chrd(realsolid=false) = [
// 0 Chord 0.25
// 0 Name: 1-4chrd.dat
// 0 Author: Tony Hafner [hafhead]
// 0 !LDRAW_ORG Primitive UPDATE 2012-02
// 0 !LICENSE Licensed under CC BY 2.0 and CC BY 4.0 : see CAreadme.txt
// 
// 0 BFC CERTIFY CCW
  [0,"BFC","CERTIFY"],
  [0,"BFC","CCW"],
// 
// 0 !HISTORY 2004-04-22 [PTadmin] Official Update 2004-02
// 0 !HISTORY 2007-10-09 [PTadmin] Header formatted for Contributor Agreement
// 0 !HISTORY 2008-07-01 [PTadmin] Official Update 2008-01
// 0 !HISTORY 2012-08-02 [MMR1988] Re-creation with PrimGen2 and Rectifier
// 0 !HISTORY 2012-08-09 [PTadmin] Official Update 2012-02
// 
// 
// 4 16 0.9239 0 0.3827 0.3827 0 0.9239 0 0 1 1 0 0
  [4,16,0.9239,0,0.3827,0.3827,0,0.9239,0,0,1,1,0,0],
// 3 16 0.7071 0 0.7071 0.3827 0 0.9239 0.9239 0 0.3827
  [3,16,0.7071,0,0.7071,0.3827,0,0.9239,0.9239,0,0.3827],
];
module ldraw_lib__1_4chrd(step=0, col=false, unit=2/5, alt=false, line=0.2, solid=!$preview)
    makepoly(ldraw_lib__1_4chrd(solid), step=step, col=col, unit=unit, alt=alt, line=line, solid=solid);
ldraw_lib__1_4chrd(line=0.2);
// main file
use <../lib.scad>
use <../p/1-4chrd.scad>
use <s/4865bs01.scad>
function ldraw_lib__4865b() = [
// 0 Panel  1 x  2 x  1 with Rounded Corners
// 0 Name: 4865b.dat
// 0 Author: Rolf Osterthun [Rolf]
// 0 !LDRAW_ORG Part UPDATE 2016-01
// 0 !LICENSE Licensed under CC BY 4.0 : see CAreadme.txt
// 
// 0 BFC CERTIFY CCW
  [0,"BFC","CERTIFY"],
  [0,"BFC","CCW"],
// 
// 0 !PREVIEW 16 0 0 0 -1 0 0 0 1 0 0 0 -1
// 
// 0 !HISTORY 2011-12-29 [PTadmin] Official Update 2011-02
// 0 !HISTORY 2016-02-16 [Darats] Subparted for Patterns
// 0 !HISTORY 2016-12-31 [PTadmin] Official Update 2016-01
// 
// 
// 1 16 0 0 0 1 0 0 0 1 0 0 0 1 s\4865bs01.dat
  [1,16,0,0,0,1,0,0,0,1,0,0,0,1, ldraw_lib__s__4865bs01()],
// 1 16 -18 2 10 0 0 -2 -2 0 0 0 -1 0 1-4chrd.dat
  [1,16,-18,2,10,0,0,-2,-2,0,0,0,-1,0, ldraw_lib__1_4chrd()],
// 1 16 18 2 10 2 0 0 0 0 -2 0 -1 0 1-4chrd.dat
  [1,16,18,2,10,2,0,0,0,0,-2,0,-1,0, ldraw_lib__1_4chrd()],
// 4 16 20 2 10 20 24 10 -20 24 10 -20 2 10
  [4,16,20,2,10,20,24,10,-20,24,10,-20,2,10],
// 4 16 -18 0 10 18 0 10 20 2 10 -20 2 10
  [4,16,-18,0,10,18,0,10,20,2,10,-20,2,10],
];
module ldraw_lib__4865b(step=0, col=false, unit=2/5, alt=false, line=0.2, solid=!$preview)
    makepoly(ldraw_lib__4865b(), step=step, col=col, unit=unit, alt=alt, line=line, solid=solid);
ldraw_lib__4865b(line=0.2);
